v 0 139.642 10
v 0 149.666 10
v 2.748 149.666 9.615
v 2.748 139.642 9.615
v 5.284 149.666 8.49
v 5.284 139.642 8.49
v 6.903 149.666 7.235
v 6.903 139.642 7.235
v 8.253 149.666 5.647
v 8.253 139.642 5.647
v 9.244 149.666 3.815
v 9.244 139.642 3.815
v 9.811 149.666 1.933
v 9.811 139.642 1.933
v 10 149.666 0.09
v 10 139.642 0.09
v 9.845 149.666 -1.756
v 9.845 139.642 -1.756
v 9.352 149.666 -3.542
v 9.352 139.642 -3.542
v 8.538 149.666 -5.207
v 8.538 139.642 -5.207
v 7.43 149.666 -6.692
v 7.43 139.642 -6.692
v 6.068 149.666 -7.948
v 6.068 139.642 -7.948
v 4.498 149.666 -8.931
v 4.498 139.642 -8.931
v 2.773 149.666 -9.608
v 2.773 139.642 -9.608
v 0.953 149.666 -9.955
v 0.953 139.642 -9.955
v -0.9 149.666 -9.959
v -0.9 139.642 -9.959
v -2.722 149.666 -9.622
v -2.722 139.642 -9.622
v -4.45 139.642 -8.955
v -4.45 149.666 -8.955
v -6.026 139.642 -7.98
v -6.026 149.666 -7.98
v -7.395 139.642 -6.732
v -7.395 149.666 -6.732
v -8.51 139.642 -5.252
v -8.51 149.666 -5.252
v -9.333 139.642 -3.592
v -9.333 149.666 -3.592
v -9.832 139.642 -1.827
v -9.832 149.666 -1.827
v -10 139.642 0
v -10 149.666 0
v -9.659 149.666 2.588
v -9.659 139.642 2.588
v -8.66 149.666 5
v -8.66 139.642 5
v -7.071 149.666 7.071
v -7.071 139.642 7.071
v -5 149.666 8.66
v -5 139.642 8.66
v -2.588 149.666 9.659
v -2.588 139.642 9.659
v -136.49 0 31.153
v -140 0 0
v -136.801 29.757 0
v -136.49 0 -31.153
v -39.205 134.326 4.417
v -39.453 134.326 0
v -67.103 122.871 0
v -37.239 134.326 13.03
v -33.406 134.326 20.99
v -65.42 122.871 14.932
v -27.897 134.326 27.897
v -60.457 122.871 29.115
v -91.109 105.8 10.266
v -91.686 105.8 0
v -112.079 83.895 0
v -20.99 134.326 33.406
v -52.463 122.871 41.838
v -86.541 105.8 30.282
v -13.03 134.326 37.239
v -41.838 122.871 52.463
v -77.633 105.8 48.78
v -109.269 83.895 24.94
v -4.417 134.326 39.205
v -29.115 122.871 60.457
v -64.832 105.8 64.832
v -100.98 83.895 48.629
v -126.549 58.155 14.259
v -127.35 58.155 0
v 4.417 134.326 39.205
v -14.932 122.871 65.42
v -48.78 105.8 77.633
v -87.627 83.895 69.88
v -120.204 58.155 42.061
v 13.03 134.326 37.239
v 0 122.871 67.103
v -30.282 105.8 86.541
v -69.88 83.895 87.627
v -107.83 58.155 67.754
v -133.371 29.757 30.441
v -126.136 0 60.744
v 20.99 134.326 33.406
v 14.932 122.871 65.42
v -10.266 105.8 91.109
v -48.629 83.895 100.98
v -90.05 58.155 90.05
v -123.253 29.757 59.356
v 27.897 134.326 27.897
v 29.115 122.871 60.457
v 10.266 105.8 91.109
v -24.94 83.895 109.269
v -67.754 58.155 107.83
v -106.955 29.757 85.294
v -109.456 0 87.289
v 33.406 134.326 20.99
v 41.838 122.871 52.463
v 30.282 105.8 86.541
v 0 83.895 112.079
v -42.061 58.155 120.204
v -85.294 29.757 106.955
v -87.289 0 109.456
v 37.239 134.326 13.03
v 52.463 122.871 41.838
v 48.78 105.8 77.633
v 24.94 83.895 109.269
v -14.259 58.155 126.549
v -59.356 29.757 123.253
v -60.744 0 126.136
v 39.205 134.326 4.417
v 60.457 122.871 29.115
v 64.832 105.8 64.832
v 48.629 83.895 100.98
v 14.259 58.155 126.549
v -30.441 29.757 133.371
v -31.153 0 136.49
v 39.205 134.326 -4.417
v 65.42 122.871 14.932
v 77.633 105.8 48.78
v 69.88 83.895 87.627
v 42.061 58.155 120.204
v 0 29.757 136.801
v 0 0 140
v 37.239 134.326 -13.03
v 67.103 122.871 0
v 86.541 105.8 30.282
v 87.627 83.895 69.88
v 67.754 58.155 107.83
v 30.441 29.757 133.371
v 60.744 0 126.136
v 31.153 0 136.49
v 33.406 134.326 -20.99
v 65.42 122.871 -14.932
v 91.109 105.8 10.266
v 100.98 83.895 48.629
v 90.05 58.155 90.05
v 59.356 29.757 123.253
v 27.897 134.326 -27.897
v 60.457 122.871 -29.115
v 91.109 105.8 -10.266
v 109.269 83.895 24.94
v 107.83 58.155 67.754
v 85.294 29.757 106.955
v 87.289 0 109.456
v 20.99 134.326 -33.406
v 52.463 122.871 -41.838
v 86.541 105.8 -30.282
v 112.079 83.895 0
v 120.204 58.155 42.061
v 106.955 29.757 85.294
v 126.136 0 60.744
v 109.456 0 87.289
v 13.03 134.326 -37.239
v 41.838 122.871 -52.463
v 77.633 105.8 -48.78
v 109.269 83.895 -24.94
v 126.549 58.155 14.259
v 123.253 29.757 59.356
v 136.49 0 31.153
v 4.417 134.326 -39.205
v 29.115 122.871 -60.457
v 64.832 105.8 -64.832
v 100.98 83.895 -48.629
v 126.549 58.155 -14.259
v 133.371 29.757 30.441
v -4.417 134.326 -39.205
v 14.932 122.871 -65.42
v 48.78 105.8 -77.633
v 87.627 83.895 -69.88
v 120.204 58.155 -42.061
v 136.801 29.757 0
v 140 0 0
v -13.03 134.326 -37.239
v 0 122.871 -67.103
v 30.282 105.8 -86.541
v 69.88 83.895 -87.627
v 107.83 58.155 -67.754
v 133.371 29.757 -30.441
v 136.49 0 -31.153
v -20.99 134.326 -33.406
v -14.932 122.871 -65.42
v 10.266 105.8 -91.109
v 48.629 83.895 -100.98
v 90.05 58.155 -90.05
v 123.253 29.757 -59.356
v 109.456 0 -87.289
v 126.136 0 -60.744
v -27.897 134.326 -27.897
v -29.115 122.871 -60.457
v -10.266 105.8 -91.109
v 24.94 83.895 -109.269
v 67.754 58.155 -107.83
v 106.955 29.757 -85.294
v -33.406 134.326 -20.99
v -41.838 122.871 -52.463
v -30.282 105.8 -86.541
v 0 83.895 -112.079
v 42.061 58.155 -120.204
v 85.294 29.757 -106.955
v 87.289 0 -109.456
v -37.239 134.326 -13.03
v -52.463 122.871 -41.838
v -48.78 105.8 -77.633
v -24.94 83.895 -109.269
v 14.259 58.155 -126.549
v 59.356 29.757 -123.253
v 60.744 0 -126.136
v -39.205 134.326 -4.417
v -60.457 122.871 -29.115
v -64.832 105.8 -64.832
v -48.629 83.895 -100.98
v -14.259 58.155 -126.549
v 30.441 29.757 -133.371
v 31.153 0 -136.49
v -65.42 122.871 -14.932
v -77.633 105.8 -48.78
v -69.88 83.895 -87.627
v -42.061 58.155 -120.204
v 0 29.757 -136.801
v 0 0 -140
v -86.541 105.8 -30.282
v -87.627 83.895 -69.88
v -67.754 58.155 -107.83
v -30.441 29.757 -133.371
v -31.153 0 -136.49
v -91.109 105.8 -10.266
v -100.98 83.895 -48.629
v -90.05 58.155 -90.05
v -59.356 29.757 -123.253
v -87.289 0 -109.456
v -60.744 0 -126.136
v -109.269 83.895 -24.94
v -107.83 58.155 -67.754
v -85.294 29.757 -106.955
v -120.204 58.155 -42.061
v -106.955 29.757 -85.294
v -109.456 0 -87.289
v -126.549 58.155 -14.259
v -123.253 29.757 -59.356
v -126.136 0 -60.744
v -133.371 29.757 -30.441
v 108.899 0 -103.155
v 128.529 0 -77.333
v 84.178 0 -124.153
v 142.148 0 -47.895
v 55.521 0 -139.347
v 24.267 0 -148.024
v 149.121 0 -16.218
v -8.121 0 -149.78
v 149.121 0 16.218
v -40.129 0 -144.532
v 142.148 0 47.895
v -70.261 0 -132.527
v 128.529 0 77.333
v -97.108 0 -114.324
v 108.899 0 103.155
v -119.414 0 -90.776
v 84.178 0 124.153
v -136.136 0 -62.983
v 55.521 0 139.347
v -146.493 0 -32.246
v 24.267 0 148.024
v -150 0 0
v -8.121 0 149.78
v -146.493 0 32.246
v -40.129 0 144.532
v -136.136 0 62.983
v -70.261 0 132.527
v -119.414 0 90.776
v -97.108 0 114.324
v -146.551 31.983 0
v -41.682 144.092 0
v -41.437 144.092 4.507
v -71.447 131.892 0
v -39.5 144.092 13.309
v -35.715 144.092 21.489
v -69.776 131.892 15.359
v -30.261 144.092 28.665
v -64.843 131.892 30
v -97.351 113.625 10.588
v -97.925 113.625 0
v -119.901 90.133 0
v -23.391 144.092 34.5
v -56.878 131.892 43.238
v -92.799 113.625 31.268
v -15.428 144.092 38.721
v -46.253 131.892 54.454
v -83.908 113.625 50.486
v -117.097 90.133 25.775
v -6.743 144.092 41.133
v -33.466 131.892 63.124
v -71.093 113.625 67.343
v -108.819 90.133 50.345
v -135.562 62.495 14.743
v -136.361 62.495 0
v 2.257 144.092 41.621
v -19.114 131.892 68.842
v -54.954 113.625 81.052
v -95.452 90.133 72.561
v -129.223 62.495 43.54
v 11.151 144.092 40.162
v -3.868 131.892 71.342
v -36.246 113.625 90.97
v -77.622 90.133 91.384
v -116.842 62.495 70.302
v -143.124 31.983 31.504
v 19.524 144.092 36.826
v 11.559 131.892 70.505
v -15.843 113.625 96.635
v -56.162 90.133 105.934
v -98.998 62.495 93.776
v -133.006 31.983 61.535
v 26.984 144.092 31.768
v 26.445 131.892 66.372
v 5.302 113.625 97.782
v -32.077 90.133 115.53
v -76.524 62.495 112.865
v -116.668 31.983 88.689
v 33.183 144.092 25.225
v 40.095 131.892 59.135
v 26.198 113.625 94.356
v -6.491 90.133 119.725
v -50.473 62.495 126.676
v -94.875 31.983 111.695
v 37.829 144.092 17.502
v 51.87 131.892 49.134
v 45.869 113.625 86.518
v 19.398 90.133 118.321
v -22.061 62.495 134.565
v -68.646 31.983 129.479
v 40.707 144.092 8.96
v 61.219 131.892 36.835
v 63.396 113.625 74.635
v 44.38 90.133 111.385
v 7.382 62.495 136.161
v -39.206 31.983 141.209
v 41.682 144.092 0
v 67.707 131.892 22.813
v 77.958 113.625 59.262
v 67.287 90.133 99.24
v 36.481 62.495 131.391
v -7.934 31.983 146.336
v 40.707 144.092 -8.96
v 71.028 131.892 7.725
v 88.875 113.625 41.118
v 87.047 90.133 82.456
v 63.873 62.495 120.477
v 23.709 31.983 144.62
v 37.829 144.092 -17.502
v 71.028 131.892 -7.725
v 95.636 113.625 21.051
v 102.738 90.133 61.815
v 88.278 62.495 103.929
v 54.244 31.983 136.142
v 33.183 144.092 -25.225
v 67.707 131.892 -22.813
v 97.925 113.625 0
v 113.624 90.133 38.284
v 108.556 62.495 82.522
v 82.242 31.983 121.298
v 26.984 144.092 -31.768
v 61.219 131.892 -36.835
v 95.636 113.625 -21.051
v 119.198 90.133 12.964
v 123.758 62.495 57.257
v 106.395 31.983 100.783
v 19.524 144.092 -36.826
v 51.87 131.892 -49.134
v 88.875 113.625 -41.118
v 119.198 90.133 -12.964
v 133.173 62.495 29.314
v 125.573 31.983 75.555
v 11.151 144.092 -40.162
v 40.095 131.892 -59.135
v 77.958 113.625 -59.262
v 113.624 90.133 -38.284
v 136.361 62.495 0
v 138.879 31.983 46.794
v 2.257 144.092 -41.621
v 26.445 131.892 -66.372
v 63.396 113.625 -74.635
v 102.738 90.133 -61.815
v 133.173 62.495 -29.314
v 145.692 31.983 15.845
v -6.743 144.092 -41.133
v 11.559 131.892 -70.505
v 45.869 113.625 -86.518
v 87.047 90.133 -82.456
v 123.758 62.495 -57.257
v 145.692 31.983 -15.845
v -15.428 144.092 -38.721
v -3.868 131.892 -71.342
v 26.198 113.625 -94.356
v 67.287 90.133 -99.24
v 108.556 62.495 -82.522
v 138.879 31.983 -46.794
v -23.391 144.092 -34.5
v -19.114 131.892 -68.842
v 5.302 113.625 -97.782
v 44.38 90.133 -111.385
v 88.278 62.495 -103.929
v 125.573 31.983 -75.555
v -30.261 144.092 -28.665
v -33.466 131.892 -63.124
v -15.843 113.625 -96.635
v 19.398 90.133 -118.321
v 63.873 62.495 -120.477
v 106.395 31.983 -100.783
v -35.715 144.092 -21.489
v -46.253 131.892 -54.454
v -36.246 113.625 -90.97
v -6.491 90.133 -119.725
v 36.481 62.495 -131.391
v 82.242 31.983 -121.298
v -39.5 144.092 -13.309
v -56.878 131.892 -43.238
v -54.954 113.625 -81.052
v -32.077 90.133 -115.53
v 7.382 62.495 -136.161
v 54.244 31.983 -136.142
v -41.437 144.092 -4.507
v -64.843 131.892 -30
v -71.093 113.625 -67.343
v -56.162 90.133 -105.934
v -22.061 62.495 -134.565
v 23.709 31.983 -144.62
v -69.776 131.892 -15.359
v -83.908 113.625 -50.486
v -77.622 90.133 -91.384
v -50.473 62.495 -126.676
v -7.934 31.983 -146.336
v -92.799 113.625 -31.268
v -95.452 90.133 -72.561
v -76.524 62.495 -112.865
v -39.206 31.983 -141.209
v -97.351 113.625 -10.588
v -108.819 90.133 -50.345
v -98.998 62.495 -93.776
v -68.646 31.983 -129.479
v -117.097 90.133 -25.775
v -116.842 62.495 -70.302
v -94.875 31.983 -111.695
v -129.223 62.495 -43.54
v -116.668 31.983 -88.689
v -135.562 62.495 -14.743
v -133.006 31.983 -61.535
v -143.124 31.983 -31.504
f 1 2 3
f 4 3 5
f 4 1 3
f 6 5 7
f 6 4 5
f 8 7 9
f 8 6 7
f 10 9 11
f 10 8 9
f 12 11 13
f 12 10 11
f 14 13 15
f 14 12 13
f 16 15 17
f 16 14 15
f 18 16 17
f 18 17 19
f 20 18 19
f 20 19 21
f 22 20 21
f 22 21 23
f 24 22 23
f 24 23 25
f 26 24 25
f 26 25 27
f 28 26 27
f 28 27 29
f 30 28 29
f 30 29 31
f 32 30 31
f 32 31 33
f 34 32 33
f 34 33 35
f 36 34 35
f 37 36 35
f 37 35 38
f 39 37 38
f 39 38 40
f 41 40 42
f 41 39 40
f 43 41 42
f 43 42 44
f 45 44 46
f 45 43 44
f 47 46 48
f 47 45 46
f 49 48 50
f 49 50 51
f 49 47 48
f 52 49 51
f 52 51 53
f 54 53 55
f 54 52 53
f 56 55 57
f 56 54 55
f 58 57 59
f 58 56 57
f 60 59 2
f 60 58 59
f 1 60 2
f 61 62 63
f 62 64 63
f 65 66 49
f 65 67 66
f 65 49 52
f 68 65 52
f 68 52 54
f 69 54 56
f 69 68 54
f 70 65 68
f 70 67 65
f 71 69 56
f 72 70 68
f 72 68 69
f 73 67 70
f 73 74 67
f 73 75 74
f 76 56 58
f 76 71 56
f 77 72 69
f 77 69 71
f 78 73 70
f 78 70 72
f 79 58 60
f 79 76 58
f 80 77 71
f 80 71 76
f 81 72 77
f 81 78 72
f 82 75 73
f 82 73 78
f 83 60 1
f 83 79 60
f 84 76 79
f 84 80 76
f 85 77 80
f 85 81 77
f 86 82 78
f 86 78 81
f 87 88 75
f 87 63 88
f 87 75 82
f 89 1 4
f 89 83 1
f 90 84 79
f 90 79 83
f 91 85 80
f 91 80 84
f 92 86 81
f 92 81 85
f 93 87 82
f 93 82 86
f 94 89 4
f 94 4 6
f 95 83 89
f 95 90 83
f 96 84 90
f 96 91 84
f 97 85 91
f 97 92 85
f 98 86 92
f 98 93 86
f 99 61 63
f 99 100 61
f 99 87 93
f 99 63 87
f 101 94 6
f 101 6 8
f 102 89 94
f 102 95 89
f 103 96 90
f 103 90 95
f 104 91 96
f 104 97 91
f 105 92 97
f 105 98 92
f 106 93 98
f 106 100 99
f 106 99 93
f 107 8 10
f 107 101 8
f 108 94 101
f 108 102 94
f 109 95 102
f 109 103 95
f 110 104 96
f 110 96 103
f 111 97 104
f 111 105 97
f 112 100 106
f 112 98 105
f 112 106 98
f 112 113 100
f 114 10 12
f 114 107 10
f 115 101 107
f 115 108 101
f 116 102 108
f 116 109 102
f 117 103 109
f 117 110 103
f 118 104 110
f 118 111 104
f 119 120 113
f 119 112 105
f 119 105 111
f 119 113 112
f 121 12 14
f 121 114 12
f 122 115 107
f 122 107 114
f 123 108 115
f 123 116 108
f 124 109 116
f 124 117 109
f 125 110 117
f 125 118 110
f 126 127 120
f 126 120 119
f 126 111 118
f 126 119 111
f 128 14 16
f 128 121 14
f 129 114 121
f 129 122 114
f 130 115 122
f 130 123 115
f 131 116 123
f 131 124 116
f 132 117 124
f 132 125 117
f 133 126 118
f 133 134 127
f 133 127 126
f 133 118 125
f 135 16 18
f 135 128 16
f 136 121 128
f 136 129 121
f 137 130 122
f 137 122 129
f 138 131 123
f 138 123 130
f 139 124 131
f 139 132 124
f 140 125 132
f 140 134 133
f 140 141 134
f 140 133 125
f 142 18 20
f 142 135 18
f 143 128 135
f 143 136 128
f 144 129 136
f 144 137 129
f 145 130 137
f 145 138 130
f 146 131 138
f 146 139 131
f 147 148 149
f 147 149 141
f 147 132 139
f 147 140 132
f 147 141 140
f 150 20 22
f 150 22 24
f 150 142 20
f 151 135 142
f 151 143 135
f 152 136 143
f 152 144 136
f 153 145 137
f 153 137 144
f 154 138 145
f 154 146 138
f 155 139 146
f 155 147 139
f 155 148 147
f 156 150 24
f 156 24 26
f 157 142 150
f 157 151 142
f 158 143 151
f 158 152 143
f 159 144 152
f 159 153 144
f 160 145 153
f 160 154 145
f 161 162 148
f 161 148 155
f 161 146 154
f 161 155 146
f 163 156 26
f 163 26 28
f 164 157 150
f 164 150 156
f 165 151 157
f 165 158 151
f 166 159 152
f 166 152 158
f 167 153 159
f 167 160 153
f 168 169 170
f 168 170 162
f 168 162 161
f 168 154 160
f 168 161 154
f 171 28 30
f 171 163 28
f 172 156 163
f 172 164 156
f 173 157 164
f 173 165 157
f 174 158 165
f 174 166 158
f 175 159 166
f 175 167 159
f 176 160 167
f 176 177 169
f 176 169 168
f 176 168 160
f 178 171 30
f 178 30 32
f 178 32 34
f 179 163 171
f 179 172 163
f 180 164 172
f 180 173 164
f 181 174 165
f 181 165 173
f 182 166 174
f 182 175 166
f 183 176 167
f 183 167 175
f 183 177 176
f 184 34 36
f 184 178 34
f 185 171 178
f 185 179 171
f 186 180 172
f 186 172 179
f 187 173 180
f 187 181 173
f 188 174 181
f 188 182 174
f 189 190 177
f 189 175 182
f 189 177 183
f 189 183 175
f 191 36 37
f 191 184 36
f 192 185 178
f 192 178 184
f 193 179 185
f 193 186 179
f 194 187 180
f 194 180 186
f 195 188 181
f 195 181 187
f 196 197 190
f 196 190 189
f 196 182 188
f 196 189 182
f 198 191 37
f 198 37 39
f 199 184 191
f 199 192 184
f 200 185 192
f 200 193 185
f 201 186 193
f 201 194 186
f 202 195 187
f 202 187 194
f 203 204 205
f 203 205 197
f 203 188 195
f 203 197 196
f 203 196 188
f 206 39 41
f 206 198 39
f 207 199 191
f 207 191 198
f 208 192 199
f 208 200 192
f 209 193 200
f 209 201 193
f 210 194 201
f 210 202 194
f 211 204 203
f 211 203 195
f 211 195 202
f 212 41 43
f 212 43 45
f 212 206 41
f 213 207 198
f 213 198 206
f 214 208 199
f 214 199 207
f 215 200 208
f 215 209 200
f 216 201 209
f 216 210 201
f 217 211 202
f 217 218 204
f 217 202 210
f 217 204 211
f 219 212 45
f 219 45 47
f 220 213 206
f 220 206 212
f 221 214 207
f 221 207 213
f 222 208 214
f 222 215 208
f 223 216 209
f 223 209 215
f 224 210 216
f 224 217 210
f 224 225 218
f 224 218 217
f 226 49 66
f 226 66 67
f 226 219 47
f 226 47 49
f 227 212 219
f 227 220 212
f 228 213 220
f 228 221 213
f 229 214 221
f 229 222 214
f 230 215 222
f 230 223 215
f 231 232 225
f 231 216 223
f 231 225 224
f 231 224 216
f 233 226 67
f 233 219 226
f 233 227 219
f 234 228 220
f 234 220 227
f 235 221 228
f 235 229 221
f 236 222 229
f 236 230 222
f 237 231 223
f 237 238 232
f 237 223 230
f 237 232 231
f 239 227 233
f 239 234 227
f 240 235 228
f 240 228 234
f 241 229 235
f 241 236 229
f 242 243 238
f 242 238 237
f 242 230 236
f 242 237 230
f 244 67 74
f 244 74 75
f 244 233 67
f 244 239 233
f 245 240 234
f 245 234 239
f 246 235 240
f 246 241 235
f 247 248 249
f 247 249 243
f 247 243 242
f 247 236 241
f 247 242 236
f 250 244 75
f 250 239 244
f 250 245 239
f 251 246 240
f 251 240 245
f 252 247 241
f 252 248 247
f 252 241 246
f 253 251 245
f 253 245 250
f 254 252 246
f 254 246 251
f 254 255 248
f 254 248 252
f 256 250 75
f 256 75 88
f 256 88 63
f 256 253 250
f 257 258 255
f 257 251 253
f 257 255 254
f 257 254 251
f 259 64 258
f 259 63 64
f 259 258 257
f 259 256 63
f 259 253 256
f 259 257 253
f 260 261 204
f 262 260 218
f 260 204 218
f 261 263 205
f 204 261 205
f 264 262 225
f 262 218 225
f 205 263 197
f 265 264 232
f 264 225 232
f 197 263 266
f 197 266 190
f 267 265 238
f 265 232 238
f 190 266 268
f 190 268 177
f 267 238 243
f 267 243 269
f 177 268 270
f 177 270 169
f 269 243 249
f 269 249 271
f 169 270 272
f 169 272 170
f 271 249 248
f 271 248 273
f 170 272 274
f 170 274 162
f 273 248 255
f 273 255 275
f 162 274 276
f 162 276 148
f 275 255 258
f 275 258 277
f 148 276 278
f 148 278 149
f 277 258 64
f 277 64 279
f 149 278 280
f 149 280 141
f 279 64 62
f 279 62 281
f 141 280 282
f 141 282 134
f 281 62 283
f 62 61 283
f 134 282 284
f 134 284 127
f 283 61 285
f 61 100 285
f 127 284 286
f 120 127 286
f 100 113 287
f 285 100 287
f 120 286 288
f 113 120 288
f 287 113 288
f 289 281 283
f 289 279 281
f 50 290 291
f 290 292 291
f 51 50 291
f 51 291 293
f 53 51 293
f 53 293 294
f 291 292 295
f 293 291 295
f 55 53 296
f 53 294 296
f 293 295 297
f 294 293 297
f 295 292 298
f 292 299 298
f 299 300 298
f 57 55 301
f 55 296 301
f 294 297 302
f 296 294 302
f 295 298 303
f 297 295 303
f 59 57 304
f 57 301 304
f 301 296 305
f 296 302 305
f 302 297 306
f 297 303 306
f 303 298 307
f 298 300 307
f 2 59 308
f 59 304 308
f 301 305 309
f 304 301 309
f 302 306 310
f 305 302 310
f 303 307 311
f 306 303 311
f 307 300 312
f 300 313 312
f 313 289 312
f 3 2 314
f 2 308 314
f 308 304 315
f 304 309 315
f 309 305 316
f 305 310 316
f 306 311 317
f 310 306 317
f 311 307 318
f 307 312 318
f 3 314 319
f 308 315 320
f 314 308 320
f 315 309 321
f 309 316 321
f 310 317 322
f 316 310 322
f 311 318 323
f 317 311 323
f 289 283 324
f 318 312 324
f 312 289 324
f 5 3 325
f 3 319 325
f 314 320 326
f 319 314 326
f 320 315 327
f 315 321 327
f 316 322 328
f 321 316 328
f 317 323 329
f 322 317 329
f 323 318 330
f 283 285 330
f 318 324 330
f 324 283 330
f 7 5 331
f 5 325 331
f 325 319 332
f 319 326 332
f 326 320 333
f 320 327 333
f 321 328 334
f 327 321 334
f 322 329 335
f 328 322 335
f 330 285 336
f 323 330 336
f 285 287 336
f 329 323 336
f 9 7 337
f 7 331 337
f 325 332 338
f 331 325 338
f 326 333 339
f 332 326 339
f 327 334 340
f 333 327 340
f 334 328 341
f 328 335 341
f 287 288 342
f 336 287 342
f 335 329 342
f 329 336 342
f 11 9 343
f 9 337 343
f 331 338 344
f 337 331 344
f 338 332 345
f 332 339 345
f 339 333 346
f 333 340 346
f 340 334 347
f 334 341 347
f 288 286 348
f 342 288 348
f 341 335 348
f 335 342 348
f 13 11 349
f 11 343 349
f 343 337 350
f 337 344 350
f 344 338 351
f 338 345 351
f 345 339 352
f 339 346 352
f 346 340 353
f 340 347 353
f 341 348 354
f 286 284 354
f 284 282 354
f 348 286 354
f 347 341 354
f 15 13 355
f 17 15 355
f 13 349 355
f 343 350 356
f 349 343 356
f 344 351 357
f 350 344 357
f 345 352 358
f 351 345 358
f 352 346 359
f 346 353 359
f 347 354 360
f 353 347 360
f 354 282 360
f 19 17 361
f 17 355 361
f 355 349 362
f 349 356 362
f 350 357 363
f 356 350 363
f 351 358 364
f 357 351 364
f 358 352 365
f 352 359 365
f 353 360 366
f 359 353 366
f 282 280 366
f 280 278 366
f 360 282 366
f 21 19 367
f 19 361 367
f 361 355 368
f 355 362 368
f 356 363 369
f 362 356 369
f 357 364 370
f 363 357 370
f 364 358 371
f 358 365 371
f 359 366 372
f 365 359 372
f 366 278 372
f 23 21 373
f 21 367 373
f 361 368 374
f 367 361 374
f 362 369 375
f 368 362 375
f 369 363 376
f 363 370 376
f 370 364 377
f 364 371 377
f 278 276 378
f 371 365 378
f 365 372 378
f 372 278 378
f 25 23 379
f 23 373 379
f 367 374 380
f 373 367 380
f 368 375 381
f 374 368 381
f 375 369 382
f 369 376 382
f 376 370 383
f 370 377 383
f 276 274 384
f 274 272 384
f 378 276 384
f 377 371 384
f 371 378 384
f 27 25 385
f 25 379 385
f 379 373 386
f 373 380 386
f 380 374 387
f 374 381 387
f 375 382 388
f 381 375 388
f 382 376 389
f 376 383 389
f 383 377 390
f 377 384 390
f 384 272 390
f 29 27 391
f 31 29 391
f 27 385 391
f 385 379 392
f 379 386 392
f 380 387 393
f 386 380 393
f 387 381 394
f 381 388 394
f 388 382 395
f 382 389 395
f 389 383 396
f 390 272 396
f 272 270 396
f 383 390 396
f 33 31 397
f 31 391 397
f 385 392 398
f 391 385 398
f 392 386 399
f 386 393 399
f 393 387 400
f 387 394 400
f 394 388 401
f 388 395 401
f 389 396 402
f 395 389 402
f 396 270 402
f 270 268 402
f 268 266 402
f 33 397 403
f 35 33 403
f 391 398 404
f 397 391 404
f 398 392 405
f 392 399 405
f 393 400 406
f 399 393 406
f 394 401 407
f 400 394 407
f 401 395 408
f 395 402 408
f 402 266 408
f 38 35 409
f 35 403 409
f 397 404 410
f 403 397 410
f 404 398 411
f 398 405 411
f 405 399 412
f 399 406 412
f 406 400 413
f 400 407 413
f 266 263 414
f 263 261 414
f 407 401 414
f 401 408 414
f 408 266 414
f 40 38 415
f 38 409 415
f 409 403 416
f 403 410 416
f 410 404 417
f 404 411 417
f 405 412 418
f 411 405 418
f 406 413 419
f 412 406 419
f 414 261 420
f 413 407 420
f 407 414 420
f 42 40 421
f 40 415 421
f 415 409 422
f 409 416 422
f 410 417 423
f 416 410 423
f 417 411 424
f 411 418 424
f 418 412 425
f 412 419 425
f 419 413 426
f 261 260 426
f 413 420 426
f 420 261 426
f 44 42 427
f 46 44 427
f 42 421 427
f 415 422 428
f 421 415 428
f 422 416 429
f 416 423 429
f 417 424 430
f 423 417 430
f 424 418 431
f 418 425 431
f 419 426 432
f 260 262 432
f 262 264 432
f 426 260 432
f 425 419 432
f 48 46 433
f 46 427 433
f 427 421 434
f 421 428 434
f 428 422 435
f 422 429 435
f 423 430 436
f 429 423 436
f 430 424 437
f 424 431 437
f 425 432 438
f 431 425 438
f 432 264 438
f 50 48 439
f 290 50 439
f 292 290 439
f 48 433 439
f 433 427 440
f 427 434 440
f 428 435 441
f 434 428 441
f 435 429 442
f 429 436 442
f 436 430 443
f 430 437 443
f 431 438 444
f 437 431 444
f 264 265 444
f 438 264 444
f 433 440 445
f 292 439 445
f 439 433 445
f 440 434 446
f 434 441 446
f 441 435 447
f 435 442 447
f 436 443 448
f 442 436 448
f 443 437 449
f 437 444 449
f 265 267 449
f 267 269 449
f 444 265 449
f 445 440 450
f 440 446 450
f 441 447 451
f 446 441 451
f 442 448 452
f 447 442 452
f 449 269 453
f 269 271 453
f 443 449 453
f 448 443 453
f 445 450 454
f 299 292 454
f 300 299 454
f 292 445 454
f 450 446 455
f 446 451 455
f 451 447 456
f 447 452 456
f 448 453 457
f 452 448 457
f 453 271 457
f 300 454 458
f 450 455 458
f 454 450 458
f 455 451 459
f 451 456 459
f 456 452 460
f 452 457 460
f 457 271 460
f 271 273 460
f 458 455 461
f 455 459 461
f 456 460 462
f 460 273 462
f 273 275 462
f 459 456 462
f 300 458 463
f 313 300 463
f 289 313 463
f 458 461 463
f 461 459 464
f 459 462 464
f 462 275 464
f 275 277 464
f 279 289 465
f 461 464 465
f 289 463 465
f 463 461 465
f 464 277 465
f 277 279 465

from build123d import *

# Parameters (mm, degrees)
SHELL1_T                = -10
SKETCH2_R               = 10
CUT_EXTRUDE3_DEPTH      = 260.807621135
CUT_EXTRUDE3_DEPTH_BACK = 260.807621135


with BuildPart() as part:
    # Sketch1 → Revolve1 (revolve)
    with BuildSketch(Plane.XY):
        with BuildLine():
            Line((0, 0), (0, 150))
            ThreePointArc((0, 150), (-106.066017178, 106.066017178), (-150, 0))
            Line((-150, 0), (0, 0))
        make_face()
    revolve(axis=Axis((0, 0, 0), (0, 1, 0)))

    # Shell1
    shell1_openings = [part.faces().sort_by_distance(p)[0] for p in [
        (0, 0, 0),
    ]]
    offset(amount=SHELL1_T, openings=shell1_openings, kind=Kind.INTERSECTION)

    # Sketch2 → Cut-Extrude3 (cut, two sides)
    with BuildSketch(Plane(origin=(0, 0, 0), x_dir=(1, 0, 0), z_dir=(0, 1, 0))) as cut_extrude3_sk:
        with Locations(Location((0, 0, 0), (0, 0, 270))):
            Circle(SKETCH2_R)
    extrude(amount=CUT_EXTRUDE3_DEPTH, mode=Mode.SUBTRACT)
    extrude(cut_extrude3_sk.sketch, amount=-CUT_EXTRUDE3_DEPTH_BACK, mode=Mode.SUBTRACT)


solid = part.part
